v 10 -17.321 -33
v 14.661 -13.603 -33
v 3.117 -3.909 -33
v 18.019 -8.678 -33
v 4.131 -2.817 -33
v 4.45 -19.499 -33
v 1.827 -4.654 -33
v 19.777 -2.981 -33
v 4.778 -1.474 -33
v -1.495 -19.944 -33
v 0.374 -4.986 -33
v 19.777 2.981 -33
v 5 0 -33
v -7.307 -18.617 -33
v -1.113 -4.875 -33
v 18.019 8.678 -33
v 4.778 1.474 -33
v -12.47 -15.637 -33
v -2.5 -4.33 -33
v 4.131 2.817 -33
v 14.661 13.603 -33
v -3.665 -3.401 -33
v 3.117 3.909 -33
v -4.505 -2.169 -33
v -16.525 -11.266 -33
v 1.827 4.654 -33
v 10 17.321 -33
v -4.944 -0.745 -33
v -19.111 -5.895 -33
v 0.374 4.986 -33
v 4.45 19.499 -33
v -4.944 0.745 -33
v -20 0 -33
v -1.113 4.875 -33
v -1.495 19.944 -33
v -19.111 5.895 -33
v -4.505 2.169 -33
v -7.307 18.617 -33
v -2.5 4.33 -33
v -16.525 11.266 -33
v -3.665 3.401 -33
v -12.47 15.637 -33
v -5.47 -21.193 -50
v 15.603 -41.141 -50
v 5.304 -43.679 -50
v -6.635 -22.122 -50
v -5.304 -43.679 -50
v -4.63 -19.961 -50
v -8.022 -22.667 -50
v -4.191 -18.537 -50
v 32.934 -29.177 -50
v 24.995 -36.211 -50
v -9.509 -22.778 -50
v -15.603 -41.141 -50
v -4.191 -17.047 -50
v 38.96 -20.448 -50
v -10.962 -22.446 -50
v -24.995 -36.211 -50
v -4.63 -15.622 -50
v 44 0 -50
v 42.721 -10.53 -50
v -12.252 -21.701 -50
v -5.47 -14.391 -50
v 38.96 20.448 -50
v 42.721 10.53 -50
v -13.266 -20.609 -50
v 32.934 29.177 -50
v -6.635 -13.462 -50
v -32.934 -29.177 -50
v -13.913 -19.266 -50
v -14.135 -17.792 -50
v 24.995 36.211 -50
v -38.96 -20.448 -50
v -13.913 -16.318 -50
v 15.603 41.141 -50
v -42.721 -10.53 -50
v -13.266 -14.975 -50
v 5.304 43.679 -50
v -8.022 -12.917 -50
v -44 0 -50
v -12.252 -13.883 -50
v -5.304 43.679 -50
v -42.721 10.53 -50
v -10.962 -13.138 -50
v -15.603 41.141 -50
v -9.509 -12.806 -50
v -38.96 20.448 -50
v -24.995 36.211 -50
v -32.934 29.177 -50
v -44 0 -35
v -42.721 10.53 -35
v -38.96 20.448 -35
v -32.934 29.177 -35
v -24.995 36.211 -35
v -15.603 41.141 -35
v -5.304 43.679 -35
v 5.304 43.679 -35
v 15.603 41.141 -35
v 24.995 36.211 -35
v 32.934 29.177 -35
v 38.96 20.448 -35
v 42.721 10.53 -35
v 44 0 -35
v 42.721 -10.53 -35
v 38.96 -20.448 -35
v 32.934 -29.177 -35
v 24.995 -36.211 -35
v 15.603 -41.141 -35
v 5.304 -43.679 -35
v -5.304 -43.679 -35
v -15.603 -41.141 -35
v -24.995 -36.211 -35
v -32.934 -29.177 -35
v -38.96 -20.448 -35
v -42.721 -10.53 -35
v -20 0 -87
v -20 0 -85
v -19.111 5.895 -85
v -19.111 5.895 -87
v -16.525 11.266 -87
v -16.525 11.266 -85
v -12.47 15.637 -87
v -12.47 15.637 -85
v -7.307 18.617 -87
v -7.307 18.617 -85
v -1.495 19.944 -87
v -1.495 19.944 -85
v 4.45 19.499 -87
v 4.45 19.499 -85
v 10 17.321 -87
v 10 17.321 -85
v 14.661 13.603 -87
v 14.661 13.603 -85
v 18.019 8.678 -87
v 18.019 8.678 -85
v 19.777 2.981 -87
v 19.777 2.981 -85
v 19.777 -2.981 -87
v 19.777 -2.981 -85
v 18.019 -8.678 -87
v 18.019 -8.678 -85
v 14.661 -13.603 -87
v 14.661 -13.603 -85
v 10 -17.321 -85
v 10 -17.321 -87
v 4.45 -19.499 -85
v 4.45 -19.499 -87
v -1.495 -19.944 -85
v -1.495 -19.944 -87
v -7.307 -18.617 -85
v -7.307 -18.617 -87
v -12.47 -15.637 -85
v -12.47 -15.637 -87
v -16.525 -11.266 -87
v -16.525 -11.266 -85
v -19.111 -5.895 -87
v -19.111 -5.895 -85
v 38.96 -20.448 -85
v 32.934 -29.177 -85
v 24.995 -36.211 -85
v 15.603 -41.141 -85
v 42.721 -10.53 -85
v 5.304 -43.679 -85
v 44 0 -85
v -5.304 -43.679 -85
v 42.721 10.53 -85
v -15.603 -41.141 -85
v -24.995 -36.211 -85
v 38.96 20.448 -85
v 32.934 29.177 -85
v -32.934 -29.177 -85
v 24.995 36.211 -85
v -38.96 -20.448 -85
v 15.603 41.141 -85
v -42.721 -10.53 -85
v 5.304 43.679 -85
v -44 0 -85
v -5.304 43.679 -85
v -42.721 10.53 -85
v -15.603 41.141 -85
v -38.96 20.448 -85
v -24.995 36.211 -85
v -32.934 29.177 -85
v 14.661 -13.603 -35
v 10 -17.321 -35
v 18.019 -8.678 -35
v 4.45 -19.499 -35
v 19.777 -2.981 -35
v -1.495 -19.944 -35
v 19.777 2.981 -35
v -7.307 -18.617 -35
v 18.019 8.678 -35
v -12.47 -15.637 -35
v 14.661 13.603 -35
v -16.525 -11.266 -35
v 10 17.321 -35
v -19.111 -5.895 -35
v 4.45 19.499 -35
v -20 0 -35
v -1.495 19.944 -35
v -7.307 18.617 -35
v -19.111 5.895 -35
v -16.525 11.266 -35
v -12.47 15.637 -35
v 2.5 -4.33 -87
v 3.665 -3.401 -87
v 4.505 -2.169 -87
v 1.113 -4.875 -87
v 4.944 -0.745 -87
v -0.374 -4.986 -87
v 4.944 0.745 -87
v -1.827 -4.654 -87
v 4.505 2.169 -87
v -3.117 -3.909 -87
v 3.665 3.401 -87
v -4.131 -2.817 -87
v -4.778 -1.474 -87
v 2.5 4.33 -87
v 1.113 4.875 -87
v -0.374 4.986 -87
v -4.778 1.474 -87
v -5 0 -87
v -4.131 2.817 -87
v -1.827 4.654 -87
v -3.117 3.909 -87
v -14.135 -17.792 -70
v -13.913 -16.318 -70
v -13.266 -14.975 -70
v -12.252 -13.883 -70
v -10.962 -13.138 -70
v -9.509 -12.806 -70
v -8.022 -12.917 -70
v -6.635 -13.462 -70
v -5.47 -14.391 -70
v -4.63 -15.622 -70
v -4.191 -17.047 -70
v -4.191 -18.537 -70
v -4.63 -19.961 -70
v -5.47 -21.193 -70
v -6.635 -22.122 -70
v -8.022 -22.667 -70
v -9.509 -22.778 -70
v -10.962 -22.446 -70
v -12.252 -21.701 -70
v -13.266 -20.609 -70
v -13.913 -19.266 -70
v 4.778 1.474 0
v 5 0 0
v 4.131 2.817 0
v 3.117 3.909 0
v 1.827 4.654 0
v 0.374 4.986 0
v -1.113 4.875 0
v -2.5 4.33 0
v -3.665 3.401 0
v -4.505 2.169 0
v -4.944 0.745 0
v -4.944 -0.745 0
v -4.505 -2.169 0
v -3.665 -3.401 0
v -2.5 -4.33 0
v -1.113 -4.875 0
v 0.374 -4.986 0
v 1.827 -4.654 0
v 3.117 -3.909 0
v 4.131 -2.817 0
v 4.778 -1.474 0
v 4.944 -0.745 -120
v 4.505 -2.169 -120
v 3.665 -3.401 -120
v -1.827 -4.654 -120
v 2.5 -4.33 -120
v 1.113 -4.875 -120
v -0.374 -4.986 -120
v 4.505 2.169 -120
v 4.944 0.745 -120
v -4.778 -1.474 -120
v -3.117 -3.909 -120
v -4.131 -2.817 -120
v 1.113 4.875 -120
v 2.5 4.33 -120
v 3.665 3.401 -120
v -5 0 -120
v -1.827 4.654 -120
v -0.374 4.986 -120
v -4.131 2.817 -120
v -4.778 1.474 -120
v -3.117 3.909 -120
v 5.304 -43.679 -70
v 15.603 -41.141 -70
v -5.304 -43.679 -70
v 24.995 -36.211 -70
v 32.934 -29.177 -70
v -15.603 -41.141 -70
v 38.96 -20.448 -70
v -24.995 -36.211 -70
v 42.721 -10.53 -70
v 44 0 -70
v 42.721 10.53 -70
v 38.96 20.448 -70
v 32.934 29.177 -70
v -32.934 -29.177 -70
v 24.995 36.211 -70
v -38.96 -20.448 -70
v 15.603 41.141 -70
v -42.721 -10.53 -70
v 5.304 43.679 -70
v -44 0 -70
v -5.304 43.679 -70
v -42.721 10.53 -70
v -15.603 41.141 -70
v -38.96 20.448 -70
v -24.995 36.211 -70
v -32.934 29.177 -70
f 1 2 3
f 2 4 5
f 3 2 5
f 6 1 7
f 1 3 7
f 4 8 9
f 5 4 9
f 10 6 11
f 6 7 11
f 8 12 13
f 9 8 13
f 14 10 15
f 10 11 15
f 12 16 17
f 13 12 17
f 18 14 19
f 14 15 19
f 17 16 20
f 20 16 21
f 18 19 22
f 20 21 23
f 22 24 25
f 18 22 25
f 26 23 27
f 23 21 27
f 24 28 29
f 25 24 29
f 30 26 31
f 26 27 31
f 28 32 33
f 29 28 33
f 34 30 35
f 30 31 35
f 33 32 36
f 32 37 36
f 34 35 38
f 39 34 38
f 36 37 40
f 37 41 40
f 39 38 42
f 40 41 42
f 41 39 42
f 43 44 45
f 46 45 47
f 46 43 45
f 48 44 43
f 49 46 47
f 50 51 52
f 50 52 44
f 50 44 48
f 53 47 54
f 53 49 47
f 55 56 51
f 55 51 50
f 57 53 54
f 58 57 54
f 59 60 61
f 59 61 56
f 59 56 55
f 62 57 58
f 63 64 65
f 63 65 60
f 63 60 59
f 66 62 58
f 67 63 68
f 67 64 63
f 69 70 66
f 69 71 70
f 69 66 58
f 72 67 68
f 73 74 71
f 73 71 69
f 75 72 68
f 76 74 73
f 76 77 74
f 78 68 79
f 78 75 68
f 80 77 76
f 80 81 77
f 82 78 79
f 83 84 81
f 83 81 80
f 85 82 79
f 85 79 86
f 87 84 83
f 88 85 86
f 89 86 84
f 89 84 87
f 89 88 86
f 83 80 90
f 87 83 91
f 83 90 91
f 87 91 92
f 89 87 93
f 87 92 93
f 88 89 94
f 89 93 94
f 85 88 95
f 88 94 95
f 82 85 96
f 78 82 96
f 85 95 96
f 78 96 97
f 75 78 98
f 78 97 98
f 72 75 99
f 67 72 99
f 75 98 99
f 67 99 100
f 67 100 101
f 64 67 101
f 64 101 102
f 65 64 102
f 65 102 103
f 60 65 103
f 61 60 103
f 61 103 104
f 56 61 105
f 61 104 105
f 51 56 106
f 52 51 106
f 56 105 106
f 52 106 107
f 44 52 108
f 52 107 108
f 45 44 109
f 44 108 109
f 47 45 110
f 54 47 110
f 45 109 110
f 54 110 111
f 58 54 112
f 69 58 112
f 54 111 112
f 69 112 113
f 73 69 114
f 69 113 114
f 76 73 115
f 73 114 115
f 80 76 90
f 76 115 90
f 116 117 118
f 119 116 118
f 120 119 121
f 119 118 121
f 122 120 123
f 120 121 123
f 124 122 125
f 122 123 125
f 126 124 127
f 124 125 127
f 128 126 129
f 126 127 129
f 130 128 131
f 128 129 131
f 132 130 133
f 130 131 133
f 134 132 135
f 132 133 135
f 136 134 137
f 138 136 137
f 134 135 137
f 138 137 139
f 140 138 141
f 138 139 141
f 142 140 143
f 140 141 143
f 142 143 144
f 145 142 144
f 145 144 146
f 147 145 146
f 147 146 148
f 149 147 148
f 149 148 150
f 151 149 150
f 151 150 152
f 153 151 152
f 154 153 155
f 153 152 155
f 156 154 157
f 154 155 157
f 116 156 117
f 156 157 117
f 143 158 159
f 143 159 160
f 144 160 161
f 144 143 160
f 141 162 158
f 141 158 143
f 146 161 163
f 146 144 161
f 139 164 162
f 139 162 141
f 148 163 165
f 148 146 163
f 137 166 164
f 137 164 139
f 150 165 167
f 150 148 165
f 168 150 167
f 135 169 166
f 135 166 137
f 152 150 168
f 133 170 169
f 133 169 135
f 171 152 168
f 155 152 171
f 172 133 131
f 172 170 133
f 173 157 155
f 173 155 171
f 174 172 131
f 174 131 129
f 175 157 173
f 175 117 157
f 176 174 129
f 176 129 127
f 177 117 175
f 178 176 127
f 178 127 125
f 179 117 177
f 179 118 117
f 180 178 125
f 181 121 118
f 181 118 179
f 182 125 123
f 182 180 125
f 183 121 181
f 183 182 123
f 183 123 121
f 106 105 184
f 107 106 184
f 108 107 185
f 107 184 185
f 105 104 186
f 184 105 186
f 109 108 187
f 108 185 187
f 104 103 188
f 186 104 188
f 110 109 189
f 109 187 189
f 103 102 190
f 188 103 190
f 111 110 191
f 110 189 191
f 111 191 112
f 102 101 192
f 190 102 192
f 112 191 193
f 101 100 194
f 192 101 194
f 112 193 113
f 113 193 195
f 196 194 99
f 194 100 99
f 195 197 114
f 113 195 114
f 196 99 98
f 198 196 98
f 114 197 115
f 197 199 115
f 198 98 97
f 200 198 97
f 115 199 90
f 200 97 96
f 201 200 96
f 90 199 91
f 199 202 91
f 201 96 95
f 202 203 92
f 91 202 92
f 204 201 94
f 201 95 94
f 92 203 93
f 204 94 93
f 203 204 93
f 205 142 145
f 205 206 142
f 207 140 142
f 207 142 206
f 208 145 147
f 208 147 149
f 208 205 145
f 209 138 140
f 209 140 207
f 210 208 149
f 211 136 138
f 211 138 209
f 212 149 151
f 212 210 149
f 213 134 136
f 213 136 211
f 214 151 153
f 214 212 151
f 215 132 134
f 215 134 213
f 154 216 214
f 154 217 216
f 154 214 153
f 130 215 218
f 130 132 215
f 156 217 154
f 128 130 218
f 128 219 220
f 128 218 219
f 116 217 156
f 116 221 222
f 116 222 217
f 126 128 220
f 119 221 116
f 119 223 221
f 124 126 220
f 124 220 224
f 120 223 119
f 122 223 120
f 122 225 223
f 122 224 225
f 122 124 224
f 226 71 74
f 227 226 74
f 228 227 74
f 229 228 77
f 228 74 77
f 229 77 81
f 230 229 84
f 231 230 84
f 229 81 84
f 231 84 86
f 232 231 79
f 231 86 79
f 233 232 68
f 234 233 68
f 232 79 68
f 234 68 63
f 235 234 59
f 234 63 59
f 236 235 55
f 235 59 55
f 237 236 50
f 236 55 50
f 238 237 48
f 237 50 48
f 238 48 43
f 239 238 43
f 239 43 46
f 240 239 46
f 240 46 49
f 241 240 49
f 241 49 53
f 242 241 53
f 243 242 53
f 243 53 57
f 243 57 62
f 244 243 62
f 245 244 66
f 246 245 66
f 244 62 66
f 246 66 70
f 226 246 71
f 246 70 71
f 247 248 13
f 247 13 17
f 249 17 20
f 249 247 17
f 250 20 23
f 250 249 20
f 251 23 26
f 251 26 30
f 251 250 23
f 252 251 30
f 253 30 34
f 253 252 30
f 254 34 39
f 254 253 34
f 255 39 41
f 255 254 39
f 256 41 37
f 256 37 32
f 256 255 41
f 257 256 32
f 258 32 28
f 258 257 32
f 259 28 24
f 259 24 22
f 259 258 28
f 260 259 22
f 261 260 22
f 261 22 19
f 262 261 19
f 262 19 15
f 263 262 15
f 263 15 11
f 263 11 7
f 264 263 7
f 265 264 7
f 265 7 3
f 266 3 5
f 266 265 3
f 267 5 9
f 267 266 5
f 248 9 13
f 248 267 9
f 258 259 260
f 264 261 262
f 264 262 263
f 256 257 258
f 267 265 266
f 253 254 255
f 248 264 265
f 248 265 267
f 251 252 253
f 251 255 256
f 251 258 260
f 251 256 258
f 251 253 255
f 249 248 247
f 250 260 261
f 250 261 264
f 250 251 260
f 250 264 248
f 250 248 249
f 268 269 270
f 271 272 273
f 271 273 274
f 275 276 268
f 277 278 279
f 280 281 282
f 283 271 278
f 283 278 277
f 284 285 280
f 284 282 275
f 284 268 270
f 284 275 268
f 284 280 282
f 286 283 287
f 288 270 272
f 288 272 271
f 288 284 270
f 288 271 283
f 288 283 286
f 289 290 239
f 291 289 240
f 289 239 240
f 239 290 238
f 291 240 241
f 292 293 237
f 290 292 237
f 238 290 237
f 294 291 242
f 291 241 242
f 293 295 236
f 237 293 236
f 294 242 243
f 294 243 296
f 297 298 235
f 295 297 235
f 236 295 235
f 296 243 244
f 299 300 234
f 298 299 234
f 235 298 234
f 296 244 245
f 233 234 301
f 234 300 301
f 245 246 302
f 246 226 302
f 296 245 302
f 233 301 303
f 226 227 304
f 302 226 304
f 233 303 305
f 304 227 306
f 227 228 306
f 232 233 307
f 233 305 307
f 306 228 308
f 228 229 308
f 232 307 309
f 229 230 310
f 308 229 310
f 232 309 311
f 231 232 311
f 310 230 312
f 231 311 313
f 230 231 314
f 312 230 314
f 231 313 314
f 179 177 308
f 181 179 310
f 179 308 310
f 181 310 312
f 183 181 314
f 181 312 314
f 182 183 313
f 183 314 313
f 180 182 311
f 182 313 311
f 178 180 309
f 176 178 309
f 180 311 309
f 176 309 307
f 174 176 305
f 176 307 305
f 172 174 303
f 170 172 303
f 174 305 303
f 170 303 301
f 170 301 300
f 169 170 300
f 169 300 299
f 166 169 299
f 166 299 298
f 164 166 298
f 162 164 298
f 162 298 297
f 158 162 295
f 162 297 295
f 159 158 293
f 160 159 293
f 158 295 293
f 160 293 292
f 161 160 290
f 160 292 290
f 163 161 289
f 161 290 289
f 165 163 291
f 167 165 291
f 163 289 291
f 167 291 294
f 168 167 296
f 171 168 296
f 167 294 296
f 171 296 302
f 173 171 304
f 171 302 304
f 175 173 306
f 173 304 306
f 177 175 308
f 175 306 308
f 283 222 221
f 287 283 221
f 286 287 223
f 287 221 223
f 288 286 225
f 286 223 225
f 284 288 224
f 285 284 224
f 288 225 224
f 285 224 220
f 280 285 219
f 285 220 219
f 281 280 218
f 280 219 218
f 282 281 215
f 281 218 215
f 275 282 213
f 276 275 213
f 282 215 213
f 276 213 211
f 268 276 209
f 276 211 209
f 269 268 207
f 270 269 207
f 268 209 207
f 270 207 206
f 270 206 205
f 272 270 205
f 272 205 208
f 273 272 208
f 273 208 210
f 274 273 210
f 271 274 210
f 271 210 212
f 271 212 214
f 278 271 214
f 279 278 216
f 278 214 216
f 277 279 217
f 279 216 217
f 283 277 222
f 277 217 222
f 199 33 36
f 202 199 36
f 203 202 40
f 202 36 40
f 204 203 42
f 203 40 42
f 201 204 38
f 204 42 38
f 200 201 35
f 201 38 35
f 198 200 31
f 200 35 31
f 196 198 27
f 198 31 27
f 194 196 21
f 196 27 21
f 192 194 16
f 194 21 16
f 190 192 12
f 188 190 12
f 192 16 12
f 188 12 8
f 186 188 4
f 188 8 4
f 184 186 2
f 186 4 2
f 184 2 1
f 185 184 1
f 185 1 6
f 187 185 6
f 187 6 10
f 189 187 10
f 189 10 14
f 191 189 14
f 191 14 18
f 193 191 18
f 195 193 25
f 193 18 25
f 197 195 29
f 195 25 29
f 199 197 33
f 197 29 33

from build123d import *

# Parameters (mm, degrees)
SZKIC1_R                    = 5
DODANIE_WYCI_GNI_CIE1_DEPTH = 33
SZKIC2_R                    = 20
DODANIE_WYCI_GNI_CIE2_DEPTH = 2
SZKIC3_R                    = 44
DODANIE_WYCI_GNI_CIE3_DEPTH = 15
SZKIC5_R                    = 5
DODANIE_WYCI_GNI_CIE6_DEPTH = 20
SZKIC6_R                    = 44
DODANIE_WYCI_GNI_CIE7_DEPTH = 15
SZKIC7_R                    = 20
DODANIE_WYCI_GNI_CIE8_DEPTH = 2
SZKIC8_R                    = 5
DODANIE_WYCI_GNI_CIE9_DEPTH = 33


with BuildPart() as part:
    # Szkic1 → Dodanie-wyciągnięcie1 (new body)
    with BuildSketch(Plane.XY):
        Circle(SZKIC1_R)
    extrude(amount=-DODANIE_WYCI_GNI_CIE1_DEPTH)

    # Szkic2 → Dodanie-wyciągnięcie2 (add)
    with BuildSketch(Plane(origin=(0, 0, -33), x_dir=(-1, 0, 0), z_dir=(0, 0, -1))):
        Circle(SZKIC2_R)
    extrude(amount=DODANIE_WYCI_GNI_CIE2_DEPTH)

    # Szkic3 → Dodanie-wyciągnięcie3 (add)
    with BuildSketch(Plane(origin=(0, 0, -35), x_dir=(-1, 0, 0), z_dir=(0, 0, -1))):
        Circle(SZKIC3_R)
    extrude(amount=DODANIE_WYCI_GNI_CIE3_DEPTH)

    # Szkic5 → Dodanie-wyciągnięcie6 (add)
    with BuildSketch(Plane(origin=(0, 0, -50), x_dir=(-1, 0, 0), z_dir=(0, 0, -1))):
        with Locations((9.134986503, -17.79190888)):
            Circle(SZKIC5_R)
    extrude(amount=DODANIE_WYCI_GNI_CIE6_DEPTH)

    # Szkic6 → Dodanie-wyciągnięcie7 (add)
    with BuildSketch(Plane(origin=(0, 0, -70), x_dir=(-1, 0, 0), z_dir=(0, 0, -1))):
        Circle(SZKIC6_R)
    extrude(amount=DODANIE_WYCI_GNI_CIE7_DEPTH)

    # Szkic7 → Dodanie-wyciągnięcie8 (add)
    with BuildSketch(Plane(origin=(0, 0, -85), x_dir=(-1, 0, 0), z_dir=(0, 0, -1))):
        Circle(SZKIC7_R)
    extrude(amount=DODANIE_WYCI_GNI_CIE8_DEPTH)

    # Szkic8 → Dodanie-wyciągnięcie9 (add)
    with BuildSketch(Plane(origin=(0, 0, -87), x_dir=(-1, 0, 0), z_dir=(0, 0, -1))):
        Circle(SZKIC8_R)
    extrude(amount=DODANIE_WYCI_GNI_CIE9_DEPTH)


solid = part.part
